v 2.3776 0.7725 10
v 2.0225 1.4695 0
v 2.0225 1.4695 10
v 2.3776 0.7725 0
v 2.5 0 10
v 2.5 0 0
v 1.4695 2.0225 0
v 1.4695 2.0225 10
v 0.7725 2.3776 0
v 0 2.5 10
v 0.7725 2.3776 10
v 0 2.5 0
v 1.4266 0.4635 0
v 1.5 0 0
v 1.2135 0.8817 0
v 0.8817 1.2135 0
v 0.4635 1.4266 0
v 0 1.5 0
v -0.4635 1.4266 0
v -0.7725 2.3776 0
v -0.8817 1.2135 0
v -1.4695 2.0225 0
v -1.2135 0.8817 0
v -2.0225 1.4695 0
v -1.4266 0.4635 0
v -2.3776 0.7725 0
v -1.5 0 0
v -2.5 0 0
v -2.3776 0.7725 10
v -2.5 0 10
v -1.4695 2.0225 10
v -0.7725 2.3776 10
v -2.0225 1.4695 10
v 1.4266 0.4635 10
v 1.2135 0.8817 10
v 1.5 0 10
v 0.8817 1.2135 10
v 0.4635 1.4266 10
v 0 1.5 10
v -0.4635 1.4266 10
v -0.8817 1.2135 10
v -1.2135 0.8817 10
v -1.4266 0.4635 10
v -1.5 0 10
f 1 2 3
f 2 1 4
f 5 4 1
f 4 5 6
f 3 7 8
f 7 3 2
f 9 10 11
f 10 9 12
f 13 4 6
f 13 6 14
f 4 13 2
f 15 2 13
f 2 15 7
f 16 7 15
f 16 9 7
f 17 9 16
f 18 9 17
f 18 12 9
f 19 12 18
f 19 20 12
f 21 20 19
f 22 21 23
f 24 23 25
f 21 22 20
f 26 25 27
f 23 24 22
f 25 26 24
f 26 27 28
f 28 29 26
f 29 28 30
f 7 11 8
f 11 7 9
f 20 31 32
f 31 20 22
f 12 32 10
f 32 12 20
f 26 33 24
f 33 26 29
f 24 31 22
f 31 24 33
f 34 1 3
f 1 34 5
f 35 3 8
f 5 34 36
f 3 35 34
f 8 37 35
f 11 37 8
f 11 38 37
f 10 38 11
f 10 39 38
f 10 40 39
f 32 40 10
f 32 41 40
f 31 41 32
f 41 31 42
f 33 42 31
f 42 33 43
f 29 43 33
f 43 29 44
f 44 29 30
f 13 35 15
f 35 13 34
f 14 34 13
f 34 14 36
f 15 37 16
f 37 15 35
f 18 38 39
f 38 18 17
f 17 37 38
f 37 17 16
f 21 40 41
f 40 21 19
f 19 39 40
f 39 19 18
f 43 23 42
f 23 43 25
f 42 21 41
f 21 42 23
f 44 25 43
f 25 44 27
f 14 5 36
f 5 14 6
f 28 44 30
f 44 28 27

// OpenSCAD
$fn = 20;

media_capa_cilindrica(10, 5, 1);


module media_capa_cilindrica(alto, diametro, grosor) {
    difference() {
        difference() {
            cylinder(alto, d = diametro);
            cylinder(alto, d = diametro - grosor * 2);
        }
        translate([-diametro/2, -diametro/2, 0]) cube([diametro, diametro/2, alto]);
    }
}
